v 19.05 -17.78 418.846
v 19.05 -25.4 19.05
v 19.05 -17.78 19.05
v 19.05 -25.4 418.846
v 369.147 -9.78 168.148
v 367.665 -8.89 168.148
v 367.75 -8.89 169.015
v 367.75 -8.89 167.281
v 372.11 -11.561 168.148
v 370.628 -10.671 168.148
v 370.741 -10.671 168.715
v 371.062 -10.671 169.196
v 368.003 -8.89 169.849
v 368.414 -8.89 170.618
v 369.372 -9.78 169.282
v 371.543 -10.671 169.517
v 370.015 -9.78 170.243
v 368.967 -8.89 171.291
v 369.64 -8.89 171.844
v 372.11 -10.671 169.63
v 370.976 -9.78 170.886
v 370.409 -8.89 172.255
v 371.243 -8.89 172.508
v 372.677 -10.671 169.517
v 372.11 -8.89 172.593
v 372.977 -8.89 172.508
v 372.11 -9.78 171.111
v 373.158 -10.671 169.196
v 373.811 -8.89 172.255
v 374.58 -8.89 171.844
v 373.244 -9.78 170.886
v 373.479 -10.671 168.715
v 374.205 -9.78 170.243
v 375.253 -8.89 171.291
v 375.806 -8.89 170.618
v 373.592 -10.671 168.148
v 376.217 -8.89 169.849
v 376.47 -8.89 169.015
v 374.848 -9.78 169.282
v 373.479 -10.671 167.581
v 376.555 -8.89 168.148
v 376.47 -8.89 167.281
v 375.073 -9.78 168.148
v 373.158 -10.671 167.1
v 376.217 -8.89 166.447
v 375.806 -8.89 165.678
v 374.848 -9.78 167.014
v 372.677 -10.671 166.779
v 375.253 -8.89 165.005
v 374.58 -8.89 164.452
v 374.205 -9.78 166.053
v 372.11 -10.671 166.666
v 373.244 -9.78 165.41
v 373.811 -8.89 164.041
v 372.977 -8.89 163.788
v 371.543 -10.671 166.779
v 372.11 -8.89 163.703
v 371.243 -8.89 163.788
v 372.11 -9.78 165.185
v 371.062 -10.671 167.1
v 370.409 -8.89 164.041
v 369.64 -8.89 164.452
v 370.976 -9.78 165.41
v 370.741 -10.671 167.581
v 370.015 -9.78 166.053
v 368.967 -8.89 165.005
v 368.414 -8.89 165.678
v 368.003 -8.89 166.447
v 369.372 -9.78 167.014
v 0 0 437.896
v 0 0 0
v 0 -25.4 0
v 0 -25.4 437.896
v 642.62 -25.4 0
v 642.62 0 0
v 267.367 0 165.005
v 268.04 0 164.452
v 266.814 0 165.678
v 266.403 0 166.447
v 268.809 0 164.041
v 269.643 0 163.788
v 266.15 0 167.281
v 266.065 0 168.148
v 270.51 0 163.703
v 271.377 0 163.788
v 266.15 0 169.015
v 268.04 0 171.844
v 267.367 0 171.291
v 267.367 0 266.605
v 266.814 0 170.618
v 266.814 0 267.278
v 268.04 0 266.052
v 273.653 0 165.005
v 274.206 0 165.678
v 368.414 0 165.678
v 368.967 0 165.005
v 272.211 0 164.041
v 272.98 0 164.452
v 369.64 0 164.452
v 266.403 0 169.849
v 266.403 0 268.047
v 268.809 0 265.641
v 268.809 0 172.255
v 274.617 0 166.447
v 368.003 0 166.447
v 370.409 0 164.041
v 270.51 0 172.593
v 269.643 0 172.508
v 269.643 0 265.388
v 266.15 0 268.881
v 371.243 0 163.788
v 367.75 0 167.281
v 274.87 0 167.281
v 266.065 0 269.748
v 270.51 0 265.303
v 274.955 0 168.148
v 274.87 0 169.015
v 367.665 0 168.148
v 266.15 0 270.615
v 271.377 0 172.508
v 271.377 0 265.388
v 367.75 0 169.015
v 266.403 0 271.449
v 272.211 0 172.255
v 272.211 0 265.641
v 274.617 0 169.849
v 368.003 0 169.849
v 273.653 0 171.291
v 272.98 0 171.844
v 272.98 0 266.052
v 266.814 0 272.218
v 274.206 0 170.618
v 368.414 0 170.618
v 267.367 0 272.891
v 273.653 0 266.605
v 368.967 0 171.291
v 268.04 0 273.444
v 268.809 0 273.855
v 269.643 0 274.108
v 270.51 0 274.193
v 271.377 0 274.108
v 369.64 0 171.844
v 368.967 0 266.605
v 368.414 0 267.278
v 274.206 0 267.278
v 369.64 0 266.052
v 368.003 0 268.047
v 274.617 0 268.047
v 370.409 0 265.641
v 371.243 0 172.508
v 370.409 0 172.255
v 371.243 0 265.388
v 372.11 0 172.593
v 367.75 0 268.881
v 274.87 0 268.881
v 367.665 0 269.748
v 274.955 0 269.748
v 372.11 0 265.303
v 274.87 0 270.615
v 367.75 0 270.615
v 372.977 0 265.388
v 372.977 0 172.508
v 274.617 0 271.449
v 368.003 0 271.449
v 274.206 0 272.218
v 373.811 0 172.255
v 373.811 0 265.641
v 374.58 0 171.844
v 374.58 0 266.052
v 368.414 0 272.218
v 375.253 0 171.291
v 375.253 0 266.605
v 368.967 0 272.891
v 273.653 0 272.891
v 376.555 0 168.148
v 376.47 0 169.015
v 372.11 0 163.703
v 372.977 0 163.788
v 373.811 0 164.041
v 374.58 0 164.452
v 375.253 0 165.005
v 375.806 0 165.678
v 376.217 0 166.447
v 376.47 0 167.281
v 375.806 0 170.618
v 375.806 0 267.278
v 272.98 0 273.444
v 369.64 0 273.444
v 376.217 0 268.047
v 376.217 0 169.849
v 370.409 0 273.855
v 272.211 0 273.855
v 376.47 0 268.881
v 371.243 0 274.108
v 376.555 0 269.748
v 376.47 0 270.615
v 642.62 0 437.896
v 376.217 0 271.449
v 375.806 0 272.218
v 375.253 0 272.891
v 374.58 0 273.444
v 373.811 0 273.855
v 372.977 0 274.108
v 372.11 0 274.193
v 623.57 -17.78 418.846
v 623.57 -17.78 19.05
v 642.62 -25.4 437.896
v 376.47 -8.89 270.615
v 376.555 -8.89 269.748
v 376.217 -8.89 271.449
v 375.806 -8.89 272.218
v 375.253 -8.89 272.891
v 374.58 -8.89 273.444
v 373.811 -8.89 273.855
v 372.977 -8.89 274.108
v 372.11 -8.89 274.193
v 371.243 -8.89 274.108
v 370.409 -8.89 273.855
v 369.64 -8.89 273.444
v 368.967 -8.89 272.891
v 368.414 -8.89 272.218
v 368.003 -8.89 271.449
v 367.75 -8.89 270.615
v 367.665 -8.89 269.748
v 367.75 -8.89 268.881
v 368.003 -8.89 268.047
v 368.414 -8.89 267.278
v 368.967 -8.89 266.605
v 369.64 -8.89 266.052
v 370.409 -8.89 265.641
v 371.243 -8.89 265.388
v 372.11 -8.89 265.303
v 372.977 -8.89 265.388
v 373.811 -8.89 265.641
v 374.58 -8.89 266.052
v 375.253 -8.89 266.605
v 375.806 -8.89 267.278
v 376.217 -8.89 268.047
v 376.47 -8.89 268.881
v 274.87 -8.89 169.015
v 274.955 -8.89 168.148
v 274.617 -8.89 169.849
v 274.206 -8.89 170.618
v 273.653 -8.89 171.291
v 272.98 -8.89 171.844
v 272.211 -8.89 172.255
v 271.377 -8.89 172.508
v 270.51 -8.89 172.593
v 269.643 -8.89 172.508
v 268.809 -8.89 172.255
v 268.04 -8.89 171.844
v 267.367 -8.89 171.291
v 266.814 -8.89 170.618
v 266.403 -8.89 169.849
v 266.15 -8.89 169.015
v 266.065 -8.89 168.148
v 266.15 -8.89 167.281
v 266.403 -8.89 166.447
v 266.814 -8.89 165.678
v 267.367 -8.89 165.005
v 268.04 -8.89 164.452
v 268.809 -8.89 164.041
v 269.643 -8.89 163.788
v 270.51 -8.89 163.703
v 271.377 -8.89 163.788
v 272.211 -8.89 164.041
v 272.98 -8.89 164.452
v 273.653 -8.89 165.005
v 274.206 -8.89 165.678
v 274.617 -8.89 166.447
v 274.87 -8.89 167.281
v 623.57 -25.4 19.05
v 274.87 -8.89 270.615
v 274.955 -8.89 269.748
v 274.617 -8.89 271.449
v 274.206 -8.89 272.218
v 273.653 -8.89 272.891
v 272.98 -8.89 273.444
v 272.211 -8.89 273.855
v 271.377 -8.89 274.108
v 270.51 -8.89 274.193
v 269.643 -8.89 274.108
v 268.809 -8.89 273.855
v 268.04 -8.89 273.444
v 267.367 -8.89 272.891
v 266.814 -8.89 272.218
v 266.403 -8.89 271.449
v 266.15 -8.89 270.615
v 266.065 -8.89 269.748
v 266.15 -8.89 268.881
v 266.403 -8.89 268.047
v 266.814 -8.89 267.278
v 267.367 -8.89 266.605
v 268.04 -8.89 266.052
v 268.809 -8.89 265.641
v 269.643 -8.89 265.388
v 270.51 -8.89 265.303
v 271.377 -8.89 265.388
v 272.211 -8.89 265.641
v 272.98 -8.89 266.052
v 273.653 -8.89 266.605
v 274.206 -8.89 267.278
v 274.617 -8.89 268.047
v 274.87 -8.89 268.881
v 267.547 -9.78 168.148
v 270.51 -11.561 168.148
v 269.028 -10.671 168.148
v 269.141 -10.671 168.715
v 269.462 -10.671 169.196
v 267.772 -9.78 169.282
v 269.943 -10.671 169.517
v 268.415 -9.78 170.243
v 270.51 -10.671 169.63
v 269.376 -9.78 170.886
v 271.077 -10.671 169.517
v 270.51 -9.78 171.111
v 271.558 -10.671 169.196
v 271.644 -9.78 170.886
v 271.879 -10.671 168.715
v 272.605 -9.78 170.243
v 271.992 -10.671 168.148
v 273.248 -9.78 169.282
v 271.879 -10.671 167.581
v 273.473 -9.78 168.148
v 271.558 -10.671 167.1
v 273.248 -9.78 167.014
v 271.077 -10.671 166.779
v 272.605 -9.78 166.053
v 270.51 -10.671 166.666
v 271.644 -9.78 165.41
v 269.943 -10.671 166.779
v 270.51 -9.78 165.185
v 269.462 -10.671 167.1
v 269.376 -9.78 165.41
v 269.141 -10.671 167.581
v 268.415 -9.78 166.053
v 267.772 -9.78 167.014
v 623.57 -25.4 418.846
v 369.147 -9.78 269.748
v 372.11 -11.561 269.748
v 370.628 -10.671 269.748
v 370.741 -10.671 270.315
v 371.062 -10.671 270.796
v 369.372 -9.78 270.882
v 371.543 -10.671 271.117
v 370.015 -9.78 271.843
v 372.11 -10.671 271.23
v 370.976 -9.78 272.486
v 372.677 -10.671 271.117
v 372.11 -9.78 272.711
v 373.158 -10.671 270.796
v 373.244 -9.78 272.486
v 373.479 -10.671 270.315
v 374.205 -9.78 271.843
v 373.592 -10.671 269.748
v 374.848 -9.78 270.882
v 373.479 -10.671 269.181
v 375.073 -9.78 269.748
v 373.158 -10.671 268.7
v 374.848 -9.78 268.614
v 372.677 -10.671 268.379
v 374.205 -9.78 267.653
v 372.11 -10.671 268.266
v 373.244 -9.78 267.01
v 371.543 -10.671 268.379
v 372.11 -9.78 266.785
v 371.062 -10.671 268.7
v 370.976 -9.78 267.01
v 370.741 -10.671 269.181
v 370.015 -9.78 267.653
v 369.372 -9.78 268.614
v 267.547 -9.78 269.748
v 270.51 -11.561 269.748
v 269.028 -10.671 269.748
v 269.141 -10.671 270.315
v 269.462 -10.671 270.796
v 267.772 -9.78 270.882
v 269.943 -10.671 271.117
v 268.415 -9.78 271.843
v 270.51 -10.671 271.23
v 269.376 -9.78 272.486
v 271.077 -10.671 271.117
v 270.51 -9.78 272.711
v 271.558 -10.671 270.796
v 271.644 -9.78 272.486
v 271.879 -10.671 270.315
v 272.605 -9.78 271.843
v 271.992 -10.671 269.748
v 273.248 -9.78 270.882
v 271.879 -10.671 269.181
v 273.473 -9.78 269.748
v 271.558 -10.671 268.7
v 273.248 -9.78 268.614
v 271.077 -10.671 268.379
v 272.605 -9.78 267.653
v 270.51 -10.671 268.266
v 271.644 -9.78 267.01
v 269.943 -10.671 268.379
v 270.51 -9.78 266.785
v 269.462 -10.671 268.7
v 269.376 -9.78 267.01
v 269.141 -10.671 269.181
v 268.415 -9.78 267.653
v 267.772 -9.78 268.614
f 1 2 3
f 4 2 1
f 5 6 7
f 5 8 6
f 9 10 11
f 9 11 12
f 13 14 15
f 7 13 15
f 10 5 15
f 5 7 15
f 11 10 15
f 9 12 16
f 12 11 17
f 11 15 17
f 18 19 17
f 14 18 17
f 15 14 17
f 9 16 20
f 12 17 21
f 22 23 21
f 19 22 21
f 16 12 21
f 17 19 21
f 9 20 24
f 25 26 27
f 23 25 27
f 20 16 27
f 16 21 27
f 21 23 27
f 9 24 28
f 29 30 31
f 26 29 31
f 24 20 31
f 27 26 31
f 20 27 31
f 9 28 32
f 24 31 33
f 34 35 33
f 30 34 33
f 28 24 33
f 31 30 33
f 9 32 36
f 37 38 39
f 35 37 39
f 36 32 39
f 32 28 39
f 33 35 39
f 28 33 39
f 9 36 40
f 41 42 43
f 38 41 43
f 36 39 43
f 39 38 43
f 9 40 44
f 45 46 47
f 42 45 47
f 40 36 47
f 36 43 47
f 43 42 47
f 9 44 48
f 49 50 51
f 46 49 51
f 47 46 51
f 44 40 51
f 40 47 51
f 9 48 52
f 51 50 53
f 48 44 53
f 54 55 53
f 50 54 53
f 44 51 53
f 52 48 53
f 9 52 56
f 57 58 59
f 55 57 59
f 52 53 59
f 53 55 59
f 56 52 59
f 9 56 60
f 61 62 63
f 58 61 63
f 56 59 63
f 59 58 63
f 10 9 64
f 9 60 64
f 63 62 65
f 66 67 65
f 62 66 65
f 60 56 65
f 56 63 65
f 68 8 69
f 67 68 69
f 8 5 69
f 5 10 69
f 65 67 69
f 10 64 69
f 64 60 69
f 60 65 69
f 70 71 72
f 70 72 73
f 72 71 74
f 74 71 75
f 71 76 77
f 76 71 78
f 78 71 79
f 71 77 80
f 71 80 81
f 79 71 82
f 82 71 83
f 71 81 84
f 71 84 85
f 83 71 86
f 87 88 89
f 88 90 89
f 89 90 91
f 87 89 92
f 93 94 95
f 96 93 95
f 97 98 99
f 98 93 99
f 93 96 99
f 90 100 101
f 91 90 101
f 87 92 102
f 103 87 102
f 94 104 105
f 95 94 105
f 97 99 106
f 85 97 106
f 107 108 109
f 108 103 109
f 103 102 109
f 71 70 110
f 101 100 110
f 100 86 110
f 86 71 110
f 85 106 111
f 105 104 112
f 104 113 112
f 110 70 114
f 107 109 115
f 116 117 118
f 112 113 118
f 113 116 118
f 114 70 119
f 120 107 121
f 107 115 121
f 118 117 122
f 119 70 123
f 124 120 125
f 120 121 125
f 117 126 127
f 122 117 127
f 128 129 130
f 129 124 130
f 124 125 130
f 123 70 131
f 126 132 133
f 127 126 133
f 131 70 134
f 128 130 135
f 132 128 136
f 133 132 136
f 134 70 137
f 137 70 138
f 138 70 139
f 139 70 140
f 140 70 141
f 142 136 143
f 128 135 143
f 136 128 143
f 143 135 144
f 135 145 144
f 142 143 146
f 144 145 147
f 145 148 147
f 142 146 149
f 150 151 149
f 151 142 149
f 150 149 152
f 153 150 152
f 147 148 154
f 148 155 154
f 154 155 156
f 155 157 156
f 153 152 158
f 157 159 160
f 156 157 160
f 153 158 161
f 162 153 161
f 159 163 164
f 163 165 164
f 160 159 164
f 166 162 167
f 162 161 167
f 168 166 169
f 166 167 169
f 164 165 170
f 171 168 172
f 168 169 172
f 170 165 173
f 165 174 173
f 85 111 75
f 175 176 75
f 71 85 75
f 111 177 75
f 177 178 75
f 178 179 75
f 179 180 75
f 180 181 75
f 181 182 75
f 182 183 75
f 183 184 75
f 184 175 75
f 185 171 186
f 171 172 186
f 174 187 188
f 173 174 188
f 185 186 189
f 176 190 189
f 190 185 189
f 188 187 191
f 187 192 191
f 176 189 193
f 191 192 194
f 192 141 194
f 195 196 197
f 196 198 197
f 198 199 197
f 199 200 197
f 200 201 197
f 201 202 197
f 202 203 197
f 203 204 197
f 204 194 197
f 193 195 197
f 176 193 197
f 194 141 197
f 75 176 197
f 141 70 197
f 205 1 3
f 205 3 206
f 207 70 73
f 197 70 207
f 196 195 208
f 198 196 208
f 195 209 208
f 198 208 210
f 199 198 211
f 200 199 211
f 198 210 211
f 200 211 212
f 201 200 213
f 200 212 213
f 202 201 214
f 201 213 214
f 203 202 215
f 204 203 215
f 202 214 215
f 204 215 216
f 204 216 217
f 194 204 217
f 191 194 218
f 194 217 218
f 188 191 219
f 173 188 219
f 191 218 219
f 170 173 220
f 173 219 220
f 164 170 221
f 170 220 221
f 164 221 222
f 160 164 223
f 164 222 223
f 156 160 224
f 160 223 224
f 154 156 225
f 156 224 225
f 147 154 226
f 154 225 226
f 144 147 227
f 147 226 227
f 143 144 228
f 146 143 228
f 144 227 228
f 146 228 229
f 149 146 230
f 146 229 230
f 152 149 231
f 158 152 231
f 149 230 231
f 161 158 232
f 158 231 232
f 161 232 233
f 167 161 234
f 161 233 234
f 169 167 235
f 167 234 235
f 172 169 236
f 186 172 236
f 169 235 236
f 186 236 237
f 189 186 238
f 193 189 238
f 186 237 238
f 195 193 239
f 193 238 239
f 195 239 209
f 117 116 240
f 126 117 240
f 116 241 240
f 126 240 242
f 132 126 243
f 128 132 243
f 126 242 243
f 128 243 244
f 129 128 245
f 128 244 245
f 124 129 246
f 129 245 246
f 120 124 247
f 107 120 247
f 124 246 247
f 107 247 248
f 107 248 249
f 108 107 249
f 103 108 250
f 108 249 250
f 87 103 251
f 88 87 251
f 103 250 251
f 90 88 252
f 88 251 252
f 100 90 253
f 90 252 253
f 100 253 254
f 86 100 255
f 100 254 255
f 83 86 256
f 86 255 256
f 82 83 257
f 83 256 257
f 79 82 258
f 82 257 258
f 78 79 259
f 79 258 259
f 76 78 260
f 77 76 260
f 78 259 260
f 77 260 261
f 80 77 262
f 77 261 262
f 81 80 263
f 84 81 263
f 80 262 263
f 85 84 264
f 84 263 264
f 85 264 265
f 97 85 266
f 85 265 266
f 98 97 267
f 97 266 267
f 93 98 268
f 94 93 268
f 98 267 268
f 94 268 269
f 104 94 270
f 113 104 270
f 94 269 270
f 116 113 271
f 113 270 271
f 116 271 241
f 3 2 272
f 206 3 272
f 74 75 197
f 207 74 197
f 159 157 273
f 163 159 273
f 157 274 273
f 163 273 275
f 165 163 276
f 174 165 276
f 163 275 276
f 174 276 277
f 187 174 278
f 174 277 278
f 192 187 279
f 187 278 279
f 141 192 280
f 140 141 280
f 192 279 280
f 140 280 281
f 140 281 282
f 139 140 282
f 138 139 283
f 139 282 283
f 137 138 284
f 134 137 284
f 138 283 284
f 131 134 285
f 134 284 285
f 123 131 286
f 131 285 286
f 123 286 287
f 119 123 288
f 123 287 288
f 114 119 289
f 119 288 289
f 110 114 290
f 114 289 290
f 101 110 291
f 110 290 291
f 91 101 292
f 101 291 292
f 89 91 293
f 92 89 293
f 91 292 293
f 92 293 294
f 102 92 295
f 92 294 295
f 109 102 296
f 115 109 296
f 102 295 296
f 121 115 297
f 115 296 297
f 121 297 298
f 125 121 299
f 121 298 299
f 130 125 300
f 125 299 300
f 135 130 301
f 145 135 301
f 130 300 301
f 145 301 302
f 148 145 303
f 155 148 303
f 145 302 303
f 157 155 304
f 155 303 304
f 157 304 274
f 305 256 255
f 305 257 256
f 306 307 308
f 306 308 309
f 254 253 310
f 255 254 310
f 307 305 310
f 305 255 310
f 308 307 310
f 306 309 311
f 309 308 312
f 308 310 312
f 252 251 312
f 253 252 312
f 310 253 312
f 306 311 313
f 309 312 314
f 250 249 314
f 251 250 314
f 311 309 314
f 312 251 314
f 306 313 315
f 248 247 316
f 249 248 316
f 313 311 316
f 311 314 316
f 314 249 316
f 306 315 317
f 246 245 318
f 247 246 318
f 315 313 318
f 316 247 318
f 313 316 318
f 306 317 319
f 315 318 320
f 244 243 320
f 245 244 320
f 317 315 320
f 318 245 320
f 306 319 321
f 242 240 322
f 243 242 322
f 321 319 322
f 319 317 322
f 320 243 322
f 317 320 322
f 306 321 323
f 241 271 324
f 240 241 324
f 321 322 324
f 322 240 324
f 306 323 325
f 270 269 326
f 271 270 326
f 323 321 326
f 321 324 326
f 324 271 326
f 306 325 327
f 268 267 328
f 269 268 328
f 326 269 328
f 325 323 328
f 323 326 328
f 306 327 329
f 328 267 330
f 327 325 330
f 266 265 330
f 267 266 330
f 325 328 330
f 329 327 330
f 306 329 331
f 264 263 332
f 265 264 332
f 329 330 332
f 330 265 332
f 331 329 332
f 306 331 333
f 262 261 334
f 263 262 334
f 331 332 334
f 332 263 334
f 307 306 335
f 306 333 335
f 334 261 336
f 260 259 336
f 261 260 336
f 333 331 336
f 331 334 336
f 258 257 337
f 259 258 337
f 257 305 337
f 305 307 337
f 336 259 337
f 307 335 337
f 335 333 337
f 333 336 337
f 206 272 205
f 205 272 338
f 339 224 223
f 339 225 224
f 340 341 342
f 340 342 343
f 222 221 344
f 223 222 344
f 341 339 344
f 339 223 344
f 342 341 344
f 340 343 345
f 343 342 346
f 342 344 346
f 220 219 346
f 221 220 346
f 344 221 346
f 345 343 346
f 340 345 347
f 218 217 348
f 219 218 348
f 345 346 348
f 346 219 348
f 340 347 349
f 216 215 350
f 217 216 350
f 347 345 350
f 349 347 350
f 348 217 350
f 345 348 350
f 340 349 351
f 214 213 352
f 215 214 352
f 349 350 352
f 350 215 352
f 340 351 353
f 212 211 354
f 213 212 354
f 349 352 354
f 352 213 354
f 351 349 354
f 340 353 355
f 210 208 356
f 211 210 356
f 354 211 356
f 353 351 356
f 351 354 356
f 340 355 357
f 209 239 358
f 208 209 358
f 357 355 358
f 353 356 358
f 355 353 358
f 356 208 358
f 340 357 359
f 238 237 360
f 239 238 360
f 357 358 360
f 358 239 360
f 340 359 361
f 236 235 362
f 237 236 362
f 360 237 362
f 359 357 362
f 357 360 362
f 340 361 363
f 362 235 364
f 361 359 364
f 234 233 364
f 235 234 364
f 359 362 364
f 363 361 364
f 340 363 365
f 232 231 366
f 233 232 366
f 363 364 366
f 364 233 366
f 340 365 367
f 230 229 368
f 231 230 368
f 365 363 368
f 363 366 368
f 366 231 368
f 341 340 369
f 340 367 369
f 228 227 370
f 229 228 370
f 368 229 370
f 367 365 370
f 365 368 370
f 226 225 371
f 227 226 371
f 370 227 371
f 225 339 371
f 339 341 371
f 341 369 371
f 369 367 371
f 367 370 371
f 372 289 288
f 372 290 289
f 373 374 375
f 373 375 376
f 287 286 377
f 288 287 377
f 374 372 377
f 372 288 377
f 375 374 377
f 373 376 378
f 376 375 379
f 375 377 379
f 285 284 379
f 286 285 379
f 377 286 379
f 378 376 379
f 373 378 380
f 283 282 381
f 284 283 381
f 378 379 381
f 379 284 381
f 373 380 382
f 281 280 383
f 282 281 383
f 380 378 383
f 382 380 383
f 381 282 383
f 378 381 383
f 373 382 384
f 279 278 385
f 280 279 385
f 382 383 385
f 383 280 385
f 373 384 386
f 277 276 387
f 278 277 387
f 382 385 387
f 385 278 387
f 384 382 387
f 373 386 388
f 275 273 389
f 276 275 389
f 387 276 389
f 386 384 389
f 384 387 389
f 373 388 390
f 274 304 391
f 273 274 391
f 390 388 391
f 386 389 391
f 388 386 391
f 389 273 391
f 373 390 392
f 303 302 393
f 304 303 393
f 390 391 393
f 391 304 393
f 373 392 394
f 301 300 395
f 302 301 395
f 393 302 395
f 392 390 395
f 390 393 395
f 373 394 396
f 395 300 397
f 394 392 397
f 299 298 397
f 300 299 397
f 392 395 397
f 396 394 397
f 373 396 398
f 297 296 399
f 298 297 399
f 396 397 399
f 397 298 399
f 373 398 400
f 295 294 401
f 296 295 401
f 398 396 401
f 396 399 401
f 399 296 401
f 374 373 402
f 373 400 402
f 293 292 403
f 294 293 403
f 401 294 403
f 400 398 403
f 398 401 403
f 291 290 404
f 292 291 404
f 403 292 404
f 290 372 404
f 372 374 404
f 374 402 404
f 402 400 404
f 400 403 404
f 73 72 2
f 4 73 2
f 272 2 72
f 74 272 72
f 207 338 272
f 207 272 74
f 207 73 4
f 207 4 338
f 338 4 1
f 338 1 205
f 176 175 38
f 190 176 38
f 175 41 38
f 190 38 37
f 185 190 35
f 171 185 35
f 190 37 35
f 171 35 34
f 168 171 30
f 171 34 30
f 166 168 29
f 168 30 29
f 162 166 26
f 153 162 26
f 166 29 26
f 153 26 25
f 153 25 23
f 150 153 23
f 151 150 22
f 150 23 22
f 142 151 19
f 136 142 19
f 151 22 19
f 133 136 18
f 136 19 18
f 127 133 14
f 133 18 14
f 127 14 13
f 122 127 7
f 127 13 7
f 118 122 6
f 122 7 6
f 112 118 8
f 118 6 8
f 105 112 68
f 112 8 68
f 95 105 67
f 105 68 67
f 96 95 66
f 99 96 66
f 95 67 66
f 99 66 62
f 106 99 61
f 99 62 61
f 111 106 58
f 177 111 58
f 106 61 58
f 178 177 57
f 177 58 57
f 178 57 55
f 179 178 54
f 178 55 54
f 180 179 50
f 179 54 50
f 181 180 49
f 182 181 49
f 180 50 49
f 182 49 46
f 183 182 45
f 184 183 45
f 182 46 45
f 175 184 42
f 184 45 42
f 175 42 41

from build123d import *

# Parameters (mm, degrees)
F0_W     = 642.62
F0_H     = 437.896
F1_DEPTH = 25.4
F3_D     = 8.89
F3_DEPTH = 8.89
F3_TIP   = 2.6708254516
F4_W     = 604.52
F4_H     = 399.796
F5_DEPTH = 7.62


with BuildPart() as f1:
    # F0 (on Front) → F1 (new body)
    with BuildSketch(Plane.XZ):
        with Locations((321.31, 218.948)):
            Rectangle(F0_W, F0_H)
    extrude(amount=F1_DEPTH)

    # F3
    with Locations(Plane(origin=(0, 0, 0), x_dir=(-1, 0, 0), z_dir=(0, 1, 0))):
        with Locations((-372.11, 269.748), (-270.51, 269.748), (-270.51, 168.148), (-372.11, 168.148)):
            Hole(F3_D / 2, depth=F3_DEPTH)
            with Locations((0, 0, -(F3_DEPTH + F3_TIP / 2))):  # 118° drill point
                Cone(0, F3_D / 2, F3_TIP, mode=Mode.SUBTRACT)

    # F4 (on face) → F5 (cut)
    with BuildSketch(Plane.XZ.offset(25.4)):
        with Locations((321.31, 218.948)):
            Rectangle(F4_W, F4_H)
    extrude(amount=-F5_DEPTH, mode=Mode.SUBTRACT)


solid = f1.part
